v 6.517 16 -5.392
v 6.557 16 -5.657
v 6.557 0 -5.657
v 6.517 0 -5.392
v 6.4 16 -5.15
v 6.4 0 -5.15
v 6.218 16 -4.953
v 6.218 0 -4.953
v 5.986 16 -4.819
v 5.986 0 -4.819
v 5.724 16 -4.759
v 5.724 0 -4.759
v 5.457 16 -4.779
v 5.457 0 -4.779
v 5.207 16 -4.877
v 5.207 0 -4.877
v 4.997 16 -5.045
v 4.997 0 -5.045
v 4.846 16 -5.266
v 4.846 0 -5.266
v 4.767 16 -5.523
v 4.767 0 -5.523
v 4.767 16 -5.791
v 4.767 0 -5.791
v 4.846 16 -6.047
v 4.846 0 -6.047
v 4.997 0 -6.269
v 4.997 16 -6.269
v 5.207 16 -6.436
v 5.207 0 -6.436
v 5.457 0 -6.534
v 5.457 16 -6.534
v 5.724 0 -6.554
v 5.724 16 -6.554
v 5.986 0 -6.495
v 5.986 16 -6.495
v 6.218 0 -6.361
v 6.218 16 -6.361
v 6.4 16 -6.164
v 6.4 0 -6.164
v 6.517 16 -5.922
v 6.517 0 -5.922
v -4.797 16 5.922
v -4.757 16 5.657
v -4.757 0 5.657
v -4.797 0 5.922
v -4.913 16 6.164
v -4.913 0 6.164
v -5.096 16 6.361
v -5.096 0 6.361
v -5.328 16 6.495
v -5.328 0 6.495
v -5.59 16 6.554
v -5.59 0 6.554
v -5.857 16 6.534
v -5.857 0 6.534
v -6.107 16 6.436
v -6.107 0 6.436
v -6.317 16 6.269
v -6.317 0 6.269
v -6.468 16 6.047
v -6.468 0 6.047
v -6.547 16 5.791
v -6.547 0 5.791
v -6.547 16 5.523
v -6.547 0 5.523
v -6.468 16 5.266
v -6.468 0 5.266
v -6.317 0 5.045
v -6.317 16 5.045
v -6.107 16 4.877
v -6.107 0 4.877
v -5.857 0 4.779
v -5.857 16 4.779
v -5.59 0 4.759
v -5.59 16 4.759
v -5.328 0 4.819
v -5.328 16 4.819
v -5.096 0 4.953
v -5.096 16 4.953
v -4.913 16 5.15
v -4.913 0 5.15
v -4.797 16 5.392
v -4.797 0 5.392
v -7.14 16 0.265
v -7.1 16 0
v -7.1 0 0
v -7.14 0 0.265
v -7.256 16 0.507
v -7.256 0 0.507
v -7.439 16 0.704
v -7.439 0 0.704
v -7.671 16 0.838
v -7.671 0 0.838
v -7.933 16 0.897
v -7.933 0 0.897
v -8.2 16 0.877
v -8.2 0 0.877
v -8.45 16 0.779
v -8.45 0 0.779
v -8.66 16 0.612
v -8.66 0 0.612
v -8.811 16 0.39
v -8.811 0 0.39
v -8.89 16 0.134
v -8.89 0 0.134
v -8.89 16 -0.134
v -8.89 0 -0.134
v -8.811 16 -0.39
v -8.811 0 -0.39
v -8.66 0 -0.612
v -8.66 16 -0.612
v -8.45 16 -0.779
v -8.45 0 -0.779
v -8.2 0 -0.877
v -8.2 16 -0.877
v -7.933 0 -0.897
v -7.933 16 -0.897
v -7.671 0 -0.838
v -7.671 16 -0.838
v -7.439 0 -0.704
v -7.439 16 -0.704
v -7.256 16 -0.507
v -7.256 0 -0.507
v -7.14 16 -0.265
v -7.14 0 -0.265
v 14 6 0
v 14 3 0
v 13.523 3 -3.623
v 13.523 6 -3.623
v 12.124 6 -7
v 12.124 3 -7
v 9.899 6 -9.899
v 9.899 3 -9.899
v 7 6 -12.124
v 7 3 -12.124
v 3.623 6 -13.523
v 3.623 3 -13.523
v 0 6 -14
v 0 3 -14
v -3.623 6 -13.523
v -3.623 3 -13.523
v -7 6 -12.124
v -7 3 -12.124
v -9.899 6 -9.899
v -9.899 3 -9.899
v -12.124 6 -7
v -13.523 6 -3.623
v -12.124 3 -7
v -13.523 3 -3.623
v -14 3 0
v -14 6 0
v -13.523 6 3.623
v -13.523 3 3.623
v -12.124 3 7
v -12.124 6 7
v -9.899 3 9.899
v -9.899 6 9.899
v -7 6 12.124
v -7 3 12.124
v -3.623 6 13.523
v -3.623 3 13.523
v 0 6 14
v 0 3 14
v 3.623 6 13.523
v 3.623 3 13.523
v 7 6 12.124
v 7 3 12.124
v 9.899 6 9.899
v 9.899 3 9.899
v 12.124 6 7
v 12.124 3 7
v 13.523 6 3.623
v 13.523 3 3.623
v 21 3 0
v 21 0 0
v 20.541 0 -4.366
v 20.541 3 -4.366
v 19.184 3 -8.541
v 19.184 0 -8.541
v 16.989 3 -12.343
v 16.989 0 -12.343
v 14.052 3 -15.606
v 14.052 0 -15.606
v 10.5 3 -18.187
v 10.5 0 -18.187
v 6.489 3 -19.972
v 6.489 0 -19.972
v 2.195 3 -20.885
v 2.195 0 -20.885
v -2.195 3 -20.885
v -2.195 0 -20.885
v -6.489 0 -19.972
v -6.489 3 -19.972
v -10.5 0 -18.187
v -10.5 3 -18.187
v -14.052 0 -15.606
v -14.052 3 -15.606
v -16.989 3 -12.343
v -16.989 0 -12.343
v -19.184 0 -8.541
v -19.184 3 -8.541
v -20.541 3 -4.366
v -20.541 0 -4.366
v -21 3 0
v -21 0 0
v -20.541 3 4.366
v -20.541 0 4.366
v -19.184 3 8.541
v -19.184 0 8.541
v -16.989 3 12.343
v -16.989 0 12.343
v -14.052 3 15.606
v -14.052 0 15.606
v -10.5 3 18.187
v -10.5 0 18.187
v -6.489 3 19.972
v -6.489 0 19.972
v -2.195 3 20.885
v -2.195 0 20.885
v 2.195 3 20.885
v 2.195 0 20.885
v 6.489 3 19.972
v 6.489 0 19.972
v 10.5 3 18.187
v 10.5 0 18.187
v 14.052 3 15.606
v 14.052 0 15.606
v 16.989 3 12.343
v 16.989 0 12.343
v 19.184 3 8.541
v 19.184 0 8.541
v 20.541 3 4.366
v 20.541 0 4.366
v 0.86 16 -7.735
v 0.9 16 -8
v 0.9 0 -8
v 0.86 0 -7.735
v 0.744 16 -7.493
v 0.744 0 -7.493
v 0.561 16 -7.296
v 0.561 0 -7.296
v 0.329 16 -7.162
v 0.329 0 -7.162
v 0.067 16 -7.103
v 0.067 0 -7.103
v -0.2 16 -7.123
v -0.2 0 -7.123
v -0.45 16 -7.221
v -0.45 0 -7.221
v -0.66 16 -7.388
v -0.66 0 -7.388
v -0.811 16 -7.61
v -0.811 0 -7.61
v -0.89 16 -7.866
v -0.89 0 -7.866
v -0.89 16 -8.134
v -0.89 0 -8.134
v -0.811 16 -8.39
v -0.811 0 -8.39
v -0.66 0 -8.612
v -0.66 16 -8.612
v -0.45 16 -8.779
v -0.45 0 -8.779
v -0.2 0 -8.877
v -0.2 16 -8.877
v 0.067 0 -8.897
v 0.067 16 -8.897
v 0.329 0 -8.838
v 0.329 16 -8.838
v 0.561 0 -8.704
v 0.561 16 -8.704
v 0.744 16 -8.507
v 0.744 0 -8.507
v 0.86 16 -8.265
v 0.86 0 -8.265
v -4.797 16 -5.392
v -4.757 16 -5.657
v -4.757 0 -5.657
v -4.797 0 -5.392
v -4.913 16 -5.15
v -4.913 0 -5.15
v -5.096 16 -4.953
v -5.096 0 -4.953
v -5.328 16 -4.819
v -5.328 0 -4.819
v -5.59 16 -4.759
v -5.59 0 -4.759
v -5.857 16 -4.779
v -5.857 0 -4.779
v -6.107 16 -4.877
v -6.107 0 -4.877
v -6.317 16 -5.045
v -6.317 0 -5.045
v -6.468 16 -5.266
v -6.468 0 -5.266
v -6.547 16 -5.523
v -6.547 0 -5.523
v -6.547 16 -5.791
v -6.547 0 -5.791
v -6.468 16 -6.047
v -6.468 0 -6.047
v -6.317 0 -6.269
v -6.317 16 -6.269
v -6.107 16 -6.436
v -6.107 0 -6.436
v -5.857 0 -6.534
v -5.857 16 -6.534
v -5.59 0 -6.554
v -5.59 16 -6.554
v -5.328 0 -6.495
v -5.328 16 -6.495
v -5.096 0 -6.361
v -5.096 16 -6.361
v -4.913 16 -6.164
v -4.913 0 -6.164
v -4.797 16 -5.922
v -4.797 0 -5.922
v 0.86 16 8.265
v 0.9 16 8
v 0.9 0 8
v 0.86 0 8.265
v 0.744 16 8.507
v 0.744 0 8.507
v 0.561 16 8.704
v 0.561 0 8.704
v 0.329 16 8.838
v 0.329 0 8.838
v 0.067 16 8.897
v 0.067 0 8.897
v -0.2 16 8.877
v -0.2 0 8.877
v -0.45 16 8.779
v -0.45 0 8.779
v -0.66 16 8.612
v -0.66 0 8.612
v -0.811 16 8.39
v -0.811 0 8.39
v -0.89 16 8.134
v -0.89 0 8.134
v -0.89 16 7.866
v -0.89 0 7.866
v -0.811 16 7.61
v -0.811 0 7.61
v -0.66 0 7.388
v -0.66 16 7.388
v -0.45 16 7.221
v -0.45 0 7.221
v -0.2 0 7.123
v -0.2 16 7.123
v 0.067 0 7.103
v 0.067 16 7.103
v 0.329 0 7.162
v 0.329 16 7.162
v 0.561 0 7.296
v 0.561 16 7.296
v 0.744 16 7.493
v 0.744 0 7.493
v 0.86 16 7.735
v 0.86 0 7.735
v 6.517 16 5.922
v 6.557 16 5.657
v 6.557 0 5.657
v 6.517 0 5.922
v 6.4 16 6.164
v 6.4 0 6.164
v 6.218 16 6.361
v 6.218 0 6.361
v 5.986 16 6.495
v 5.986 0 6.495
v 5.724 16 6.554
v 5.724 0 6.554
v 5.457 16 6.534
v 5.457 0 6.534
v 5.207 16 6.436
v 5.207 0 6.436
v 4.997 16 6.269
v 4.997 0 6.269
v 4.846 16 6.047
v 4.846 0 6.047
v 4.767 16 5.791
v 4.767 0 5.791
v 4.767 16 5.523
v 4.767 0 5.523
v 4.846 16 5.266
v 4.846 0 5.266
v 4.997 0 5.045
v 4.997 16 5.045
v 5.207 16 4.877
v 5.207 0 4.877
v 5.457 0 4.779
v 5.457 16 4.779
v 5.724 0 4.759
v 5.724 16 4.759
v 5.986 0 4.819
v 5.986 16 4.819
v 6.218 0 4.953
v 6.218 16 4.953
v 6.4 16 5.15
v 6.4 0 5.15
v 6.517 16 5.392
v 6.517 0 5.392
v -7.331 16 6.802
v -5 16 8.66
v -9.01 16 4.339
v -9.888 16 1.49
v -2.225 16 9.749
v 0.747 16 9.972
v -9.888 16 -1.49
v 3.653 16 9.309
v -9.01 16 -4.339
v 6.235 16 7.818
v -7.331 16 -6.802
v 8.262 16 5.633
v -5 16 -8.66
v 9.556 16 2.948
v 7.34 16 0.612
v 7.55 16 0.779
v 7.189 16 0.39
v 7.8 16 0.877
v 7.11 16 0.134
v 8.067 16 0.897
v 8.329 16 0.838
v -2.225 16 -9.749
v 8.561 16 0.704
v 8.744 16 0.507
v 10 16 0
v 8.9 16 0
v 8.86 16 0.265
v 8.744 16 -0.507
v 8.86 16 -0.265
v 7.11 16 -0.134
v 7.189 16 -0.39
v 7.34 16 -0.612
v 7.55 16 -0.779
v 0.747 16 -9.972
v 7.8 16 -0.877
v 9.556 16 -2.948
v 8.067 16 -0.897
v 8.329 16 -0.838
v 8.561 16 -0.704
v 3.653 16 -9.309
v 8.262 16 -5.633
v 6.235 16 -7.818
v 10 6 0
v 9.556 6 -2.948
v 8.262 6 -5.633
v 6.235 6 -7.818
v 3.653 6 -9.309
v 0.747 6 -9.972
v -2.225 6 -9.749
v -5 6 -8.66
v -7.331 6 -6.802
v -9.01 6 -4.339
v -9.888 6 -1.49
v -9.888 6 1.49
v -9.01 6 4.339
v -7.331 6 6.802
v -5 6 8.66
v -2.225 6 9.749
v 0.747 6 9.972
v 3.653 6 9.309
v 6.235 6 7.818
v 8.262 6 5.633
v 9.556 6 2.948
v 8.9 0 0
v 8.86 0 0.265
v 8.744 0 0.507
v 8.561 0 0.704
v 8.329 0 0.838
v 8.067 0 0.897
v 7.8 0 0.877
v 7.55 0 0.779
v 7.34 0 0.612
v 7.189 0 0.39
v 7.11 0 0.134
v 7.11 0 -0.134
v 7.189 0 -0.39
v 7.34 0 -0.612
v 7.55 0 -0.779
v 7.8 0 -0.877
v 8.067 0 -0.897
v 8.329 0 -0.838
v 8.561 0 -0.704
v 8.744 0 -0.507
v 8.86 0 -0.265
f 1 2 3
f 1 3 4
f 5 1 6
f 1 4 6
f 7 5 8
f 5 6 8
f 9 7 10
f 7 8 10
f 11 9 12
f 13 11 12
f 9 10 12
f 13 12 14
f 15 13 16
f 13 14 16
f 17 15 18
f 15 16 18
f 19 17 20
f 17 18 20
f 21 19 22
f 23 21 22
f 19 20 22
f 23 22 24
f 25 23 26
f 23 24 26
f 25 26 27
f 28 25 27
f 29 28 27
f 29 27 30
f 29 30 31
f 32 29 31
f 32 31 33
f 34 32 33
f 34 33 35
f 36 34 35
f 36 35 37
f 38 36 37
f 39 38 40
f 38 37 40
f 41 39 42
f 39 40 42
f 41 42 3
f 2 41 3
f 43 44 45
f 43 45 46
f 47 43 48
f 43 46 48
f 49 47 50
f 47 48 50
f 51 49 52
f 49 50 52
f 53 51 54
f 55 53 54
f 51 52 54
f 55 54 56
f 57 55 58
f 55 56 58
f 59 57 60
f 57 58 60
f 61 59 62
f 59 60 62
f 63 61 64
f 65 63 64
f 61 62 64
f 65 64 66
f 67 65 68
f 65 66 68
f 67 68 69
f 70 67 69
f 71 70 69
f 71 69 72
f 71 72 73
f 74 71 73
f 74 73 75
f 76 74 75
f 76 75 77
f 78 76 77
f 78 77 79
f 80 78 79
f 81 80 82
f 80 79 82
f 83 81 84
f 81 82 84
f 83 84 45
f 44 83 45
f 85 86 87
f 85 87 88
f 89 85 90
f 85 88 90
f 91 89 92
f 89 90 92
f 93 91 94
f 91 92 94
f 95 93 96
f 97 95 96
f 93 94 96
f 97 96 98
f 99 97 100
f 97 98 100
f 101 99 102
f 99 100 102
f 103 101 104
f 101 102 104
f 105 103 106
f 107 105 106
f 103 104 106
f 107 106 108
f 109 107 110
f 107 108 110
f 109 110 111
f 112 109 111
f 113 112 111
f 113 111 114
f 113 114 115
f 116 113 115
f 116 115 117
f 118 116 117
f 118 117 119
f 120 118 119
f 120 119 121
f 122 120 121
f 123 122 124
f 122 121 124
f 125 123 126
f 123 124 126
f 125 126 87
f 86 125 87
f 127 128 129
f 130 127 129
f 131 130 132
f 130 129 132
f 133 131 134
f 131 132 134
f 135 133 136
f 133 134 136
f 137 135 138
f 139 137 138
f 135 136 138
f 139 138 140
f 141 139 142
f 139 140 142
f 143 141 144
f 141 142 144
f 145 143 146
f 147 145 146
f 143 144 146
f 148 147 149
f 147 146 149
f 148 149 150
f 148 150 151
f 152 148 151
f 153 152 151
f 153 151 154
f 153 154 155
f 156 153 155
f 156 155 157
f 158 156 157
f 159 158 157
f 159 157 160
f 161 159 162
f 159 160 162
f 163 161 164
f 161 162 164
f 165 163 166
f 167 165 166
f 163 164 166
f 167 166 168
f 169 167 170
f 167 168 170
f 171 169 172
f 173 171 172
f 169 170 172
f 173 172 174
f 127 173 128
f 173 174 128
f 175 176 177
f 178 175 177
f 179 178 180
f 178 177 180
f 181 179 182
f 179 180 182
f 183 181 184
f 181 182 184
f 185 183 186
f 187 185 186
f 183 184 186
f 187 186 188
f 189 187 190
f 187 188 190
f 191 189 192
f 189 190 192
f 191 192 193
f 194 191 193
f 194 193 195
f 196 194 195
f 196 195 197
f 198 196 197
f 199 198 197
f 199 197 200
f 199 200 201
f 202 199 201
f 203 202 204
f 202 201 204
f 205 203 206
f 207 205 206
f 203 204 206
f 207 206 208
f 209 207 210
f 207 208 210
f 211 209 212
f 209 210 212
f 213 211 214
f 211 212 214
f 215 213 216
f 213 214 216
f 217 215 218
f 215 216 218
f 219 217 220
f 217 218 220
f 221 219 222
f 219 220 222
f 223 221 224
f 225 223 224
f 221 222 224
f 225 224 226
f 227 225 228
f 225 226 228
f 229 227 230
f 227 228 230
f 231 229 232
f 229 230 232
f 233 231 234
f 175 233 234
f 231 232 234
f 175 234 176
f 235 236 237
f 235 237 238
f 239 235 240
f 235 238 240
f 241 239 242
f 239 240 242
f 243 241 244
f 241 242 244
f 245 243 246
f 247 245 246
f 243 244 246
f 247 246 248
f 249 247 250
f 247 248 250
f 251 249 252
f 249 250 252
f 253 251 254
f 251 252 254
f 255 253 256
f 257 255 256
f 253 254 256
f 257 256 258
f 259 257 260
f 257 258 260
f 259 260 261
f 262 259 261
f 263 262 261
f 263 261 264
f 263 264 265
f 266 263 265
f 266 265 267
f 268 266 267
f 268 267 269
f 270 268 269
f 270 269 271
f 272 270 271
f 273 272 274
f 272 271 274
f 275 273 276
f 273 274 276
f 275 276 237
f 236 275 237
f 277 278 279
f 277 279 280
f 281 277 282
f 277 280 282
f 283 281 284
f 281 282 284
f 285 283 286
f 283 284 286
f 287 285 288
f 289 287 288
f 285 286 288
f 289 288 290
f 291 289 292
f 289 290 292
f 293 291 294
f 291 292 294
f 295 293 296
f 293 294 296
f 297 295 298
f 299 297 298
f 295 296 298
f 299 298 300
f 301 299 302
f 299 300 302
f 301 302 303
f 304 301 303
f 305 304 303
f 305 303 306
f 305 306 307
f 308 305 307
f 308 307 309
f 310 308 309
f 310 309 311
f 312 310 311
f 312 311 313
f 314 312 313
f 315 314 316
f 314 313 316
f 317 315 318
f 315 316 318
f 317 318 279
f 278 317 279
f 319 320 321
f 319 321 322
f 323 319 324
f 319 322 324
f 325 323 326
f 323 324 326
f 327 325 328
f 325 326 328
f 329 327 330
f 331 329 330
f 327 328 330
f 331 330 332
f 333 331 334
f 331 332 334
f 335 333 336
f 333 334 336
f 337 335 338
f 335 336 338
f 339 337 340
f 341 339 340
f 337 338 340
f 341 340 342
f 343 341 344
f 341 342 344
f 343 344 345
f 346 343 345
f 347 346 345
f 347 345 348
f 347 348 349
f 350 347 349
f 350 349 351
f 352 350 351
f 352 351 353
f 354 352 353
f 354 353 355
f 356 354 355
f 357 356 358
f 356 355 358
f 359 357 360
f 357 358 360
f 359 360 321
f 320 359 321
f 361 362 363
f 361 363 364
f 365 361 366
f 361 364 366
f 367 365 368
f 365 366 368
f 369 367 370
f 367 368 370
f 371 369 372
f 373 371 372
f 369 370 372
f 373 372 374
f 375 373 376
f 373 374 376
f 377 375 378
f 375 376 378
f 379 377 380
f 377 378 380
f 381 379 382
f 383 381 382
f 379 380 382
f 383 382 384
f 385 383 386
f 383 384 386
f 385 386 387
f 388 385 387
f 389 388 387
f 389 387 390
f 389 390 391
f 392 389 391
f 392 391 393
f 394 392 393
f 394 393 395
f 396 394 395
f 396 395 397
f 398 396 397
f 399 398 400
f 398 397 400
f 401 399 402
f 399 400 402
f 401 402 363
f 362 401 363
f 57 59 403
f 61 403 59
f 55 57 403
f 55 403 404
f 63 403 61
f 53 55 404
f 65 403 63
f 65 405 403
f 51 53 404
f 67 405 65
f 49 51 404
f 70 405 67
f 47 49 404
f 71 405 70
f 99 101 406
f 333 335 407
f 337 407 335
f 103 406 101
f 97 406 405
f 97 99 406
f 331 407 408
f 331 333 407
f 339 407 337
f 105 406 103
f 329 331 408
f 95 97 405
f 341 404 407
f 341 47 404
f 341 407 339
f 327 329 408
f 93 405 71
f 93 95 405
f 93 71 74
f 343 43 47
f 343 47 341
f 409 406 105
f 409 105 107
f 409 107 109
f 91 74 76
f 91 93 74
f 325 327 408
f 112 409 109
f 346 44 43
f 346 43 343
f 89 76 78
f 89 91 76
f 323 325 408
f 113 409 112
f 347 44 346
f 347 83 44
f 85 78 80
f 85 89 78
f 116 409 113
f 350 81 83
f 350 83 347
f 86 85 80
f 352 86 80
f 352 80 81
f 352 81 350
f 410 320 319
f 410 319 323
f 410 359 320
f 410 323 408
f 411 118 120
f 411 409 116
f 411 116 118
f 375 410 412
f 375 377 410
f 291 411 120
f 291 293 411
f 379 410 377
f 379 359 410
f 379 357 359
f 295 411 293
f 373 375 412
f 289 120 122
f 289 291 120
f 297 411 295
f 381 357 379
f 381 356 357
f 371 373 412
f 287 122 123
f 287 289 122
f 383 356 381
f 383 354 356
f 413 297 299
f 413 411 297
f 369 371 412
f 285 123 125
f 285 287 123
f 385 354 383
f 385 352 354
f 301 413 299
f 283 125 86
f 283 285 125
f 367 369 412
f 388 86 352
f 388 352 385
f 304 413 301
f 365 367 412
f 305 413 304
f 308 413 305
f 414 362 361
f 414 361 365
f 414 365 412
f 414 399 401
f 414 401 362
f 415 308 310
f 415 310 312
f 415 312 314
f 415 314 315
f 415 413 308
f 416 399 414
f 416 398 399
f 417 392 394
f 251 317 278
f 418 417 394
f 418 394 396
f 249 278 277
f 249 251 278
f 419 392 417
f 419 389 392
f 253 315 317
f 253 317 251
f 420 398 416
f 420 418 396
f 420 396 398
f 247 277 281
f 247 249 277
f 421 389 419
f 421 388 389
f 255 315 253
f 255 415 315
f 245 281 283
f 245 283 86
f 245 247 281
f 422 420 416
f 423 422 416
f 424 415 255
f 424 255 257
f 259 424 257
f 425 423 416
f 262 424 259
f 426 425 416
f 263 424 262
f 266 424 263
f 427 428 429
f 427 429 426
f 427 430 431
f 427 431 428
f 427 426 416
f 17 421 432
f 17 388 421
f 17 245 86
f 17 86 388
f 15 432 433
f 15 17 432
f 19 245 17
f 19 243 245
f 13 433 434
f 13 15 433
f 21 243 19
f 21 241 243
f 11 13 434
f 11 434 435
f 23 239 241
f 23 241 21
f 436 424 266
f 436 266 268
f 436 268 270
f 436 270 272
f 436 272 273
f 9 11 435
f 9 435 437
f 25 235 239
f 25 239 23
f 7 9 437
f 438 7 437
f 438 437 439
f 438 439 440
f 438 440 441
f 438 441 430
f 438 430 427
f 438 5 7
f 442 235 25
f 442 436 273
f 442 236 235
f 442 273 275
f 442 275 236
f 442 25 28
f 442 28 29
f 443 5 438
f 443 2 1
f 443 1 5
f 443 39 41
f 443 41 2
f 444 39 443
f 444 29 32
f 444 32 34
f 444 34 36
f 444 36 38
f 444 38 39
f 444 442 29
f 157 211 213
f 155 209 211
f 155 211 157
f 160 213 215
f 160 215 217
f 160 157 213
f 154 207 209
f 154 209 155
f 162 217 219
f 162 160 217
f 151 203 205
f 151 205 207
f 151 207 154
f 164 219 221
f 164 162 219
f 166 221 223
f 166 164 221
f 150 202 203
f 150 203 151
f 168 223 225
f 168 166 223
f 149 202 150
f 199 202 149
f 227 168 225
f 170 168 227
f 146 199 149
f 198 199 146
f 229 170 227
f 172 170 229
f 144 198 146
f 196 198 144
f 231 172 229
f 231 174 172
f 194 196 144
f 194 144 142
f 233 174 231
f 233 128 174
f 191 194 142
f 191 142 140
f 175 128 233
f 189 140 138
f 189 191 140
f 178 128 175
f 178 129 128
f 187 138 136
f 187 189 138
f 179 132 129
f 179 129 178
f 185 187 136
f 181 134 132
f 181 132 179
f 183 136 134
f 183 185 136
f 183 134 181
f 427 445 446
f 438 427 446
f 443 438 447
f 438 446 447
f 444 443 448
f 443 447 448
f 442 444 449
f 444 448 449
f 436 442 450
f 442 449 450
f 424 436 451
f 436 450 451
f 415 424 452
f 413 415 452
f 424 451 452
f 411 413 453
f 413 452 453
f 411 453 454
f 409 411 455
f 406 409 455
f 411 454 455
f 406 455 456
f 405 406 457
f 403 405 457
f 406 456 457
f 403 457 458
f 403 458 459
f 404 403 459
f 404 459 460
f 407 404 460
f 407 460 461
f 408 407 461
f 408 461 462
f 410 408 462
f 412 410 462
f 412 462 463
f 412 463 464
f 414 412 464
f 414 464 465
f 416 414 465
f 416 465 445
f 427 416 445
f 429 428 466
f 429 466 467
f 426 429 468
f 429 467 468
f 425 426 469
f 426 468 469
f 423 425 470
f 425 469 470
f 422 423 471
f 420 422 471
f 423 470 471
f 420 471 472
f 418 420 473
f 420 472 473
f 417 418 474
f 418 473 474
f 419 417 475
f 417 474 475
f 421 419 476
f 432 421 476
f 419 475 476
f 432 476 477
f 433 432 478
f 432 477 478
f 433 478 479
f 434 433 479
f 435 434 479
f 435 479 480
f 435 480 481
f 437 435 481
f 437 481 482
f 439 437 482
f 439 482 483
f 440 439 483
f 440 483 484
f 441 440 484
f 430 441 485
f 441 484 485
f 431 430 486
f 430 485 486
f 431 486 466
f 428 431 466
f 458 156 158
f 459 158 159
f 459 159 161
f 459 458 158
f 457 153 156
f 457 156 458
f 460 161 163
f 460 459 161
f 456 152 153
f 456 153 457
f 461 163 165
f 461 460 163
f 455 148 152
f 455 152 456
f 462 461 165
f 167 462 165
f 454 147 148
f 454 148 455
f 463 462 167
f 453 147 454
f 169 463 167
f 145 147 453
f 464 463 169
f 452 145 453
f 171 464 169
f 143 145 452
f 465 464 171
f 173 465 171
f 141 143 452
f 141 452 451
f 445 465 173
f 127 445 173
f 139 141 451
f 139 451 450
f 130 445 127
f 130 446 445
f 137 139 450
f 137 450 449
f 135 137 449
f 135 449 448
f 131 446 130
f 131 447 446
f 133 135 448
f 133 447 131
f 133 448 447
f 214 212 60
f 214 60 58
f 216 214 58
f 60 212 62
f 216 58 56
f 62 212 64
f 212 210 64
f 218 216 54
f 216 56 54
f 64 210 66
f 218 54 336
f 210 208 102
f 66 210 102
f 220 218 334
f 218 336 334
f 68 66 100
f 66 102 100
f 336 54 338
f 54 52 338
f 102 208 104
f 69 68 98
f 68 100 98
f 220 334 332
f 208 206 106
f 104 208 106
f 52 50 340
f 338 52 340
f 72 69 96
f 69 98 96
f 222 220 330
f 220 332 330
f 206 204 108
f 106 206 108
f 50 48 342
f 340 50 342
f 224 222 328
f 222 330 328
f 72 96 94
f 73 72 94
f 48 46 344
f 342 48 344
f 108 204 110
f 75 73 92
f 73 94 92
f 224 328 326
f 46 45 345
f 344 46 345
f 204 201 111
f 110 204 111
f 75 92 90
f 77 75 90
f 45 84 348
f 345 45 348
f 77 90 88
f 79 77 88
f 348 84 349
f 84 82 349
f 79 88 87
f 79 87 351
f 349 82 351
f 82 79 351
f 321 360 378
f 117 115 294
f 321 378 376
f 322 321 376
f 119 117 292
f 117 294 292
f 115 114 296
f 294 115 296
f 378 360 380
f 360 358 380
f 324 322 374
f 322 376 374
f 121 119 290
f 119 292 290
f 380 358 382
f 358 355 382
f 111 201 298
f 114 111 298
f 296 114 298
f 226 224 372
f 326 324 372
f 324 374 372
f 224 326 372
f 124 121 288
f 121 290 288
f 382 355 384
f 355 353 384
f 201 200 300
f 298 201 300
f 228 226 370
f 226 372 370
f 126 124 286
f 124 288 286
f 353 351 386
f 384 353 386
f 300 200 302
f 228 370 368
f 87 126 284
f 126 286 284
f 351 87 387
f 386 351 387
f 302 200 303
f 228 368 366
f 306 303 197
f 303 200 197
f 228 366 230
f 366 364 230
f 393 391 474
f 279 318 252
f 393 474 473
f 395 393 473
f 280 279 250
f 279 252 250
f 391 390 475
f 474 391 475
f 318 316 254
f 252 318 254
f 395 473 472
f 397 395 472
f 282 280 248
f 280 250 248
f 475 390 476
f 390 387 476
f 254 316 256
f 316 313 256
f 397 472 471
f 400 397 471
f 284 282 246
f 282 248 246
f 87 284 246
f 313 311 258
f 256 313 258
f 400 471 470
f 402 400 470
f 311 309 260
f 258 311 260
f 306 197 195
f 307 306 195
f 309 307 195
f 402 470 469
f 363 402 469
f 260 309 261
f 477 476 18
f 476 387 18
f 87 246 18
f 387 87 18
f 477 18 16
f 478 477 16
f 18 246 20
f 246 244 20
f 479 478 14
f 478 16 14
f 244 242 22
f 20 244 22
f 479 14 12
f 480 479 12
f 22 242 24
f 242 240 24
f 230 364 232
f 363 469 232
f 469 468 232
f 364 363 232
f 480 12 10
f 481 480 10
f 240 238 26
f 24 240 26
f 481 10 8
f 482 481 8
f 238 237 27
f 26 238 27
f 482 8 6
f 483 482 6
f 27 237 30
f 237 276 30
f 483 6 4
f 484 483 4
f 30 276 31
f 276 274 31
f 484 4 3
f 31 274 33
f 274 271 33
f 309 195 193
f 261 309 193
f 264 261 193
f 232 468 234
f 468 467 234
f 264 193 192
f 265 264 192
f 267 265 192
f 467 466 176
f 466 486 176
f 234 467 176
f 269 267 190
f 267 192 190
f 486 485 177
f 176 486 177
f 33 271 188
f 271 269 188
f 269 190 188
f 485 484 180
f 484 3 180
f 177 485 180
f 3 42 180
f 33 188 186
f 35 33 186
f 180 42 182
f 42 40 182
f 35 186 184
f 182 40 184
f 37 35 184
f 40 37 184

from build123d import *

# Parameters (mm, degrees)
SKETCH_1_R          = 21
EXTRUDE_1_DEPTH     = 3
SKETCH_2_R          = 10
EXTRUDE_2_DEPTH     = 13
SKETCH_3_R          = 14
EXTRUDE_3_DEPTH     = 3
SKETCH_4_R          = 0.9
CUT_EXTRUDE_1_DEPTH = 16


with BuildPart() as part:
    # 스케치1 → 보스-돌출1 (new body)
    with BuildSketch(Plane(origin=(0, 0, 0), x_dir=(1, 0, 0), z_dir=(0, 1, 0))):
        Circle(SKETCH_1_R)
    extrude(amount=EXTRUDE_1_DEPTH)

    # 스케치2 → 보스-돌출2 (add)
    with BuildSketch(Plane(origin=(0, 3, 0), x_dir=(1, 0, 0), z_dir=(0, 1, 0))):
        Circle(SKETCH_2_R)
    extrude(amount=EXTRUDE_2_DEPTH)

    # 스케치3 → 보스-돌출3 (add)
    with BuildSketch(Plane(origin=(0, 3, 0), x_dir=(1, 0, 0), z_dir=(0, 1, 0))):
        Circle(SKETCH_3_R)
    extrude(amount=EXTRUDE_3_DEPTH)

    # 스케치4 → 컷-돌출1 (cut)
    with BuildSketch(Plane.XZ):
        with Locations((8, 0)):
            Circle(SKETCH_4_R)
        with Locations((5.656854249, -5.656854249)):
            Circle(SKETCH_4_R)
        with Locations((5.656854249, 5.656854249)):
            Circle(SKETCH_4_R)
        with Locations((0, 8)):
            Circle(SKETCH_4_R)
        with Locations((-5.656854249, 5.656854249)):
            Circle(SKETCH_4_R)
        with Locations((0, -8)):
            Circle(SKETCH_4_R)
        with Locations((-5.656854249, -5.656854249)):
            Circle(SKETCH_4_R)
        with Locations((-8, 0)):
            Circle(SKETCH_4_R)
    extrude(amount=-CUT_EXTRUDE_1_DEPTH, mode=Mode.SUBTRACT)


solid = part.part
